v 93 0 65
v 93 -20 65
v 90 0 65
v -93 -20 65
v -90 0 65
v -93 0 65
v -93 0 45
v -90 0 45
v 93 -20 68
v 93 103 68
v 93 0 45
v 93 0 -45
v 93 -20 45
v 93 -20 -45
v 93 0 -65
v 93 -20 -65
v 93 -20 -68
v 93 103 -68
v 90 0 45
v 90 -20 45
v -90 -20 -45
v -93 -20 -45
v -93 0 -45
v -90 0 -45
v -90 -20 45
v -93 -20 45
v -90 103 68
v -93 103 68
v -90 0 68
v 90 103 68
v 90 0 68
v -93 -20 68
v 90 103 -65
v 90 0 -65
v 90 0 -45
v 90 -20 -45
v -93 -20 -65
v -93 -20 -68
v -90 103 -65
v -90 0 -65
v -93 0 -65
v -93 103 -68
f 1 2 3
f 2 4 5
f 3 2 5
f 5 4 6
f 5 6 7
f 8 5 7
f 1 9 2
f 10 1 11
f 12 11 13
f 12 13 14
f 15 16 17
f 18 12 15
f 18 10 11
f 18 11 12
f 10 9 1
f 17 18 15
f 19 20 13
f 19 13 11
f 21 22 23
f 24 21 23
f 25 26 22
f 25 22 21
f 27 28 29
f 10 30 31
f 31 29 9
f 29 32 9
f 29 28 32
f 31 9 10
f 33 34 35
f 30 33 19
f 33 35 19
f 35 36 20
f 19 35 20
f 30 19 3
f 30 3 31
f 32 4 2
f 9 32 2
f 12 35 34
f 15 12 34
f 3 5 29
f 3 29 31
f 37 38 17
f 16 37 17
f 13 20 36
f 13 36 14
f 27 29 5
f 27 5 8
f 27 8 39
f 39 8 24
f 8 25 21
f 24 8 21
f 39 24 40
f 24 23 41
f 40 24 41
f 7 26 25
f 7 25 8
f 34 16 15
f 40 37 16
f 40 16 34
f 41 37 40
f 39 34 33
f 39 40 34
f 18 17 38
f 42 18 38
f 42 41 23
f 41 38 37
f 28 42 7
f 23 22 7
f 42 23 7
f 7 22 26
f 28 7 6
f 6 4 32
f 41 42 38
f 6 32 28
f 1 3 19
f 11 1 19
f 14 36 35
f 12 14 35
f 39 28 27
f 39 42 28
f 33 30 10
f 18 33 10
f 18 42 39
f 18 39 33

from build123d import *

# Parameters (mm, degrees)
SKETCH2_W               = 186
SKETCH2_H               = 136
BOSS_EXTRUDE1_DEPTH     = 20
BOSS_EXTRUDE2_DEPTH     = 103
CUT_EXTRUDE1_DEPTH      = 224.224102641
CUT_EXTRUDE1_DEPTH_BACK = 224.224102641
SKETCH4_W               = 20
SKETCH4_H               = 20


with BuildPart() as part:
    # Sketch2 → Boss-Extrude1 (new body)
    with BuildSketch(Plane(origin=(0, 0, 0), x_dir=(1, 0, 0), z_dir=(0, 1, 0))):
        Rectangle(SKETCH2_W, SKETCH2_H)
        Polygon((-90, -65), (-90, -60), (-90, 60), (-90, 65), (90, 65), (90, 60), (90, -60), (90, -65), align=None, mode=Mode.SUBTRACT)
    extrude(amount=-BOSS_EXTRUDE1_DEPTH)

    # Sketch3 → Boss-Extrude2 (add)
    with BuildSketch(Plane(origin=(0, 0, 0), x_dir=(1, 0, 0), z_dir=(0, 1, 0))):
        Polygon((-93, 65), (-93, -68), (-90, -68), (-90, -65), (-90, 65), align=None)
        Polygon((-93, 68), (-93, 65), (-90, 65), (90, 65), (93, 65), (93, 68), align=None)
        Polygon((90, -65), (90, -68), (93, -68), (93, 65), (90, 65), align=None)
    extrude(amount=BOSS_EXTRUDE2_DEPTH)

    # Sketch4 → Cut-Extrude1 (cut, two sides: drawn at the far end of the back side and taken through both)
    with BuildSketch(Plane(origin=(93, 0, 0), x_dir=(0, 0, -1), z_dir=(1, 0, 0)).offset(-CUT_EXTRUDE1_DEPTH_BACK)):
        with Locations((-55, -10)):
            Rectangle(SKETCH4_W, SKETCH4_H)
        with Locations((55, -10)):
            Rectangle(SKETCH4_W, SKETCH4_H)
    extrude(amount=CUT_EXTRUDE1_DEPTH + CUT_EXTRUDE1_DEPTH_BACK, mode=Mode.SUBTRACT)


solid = part.part
